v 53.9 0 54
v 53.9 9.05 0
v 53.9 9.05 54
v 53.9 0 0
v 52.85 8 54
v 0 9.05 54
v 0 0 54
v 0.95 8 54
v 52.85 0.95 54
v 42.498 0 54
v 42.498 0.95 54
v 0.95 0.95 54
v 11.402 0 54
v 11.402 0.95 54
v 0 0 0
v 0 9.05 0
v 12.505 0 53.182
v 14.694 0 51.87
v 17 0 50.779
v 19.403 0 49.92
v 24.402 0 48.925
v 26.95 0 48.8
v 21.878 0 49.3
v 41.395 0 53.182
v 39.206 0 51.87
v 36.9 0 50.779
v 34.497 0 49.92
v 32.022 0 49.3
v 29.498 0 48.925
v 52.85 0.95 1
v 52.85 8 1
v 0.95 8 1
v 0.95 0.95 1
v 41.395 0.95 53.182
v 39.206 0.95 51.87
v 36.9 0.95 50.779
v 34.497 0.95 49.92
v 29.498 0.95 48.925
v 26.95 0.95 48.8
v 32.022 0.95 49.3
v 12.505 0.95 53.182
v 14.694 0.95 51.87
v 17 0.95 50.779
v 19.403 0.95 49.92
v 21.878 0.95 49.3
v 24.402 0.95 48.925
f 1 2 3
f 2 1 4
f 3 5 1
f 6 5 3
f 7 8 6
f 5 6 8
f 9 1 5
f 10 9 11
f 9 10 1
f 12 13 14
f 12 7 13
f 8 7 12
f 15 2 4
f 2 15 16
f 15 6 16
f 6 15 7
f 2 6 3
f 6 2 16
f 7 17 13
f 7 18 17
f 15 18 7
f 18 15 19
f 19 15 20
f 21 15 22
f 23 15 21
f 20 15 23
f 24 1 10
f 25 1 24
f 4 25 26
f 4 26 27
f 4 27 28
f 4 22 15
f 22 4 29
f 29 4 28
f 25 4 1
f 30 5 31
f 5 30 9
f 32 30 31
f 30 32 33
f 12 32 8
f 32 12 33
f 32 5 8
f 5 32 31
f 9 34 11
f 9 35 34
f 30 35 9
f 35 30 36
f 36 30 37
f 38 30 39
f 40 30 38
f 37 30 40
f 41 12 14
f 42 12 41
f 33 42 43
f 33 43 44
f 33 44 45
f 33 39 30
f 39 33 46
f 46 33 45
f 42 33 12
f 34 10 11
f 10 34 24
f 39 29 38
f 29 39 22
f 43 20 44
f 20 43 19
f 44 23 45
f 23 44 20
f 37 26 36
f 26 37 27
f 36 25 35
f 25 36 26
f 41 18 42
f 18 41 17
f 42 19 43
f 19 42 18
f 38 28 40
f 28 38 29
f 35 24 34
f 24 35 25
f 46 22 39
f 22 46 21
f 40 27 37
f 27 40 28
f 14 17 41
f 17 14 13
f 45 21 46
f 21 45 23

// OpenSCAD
/* [Filter Settings] */
Filter_Diameter = 52;
Filter_Thickness = 7.15;

/* [Case Settings] */
Case_Thickness = 1;
Width_Offset = -0.1;
Thickness_Offset = -0.1;
Height_Offset = 1;

/* [Hidden] */
Case_X = Filter_Diameter + 2*Case_Thickness + Width_Offset;
Case_Y = Filter_Thickness + 2*Case_Thickness + Thickness_Offset;
Case_Z = Filter_Diameter + Case_Thickness + Height_Offset;

f = 0.01;
df = 2*f;
$fn = 64;

difference() {
    cube([Case_X, Case_Y, Case_Z]);
    translate([(2*Case_Thickness + Width_Offset)/2, (2*Case_Thickness + Thickness_Offset)/2, Case_Thickness])
        cube([Filter_Diameter + Width_Offset, Filter_Thickness + Thickness_Offset, Filter_Diameter + Height_Offset + f]);
    translate([Case_X/2, Case_Thickness + f, Case_Z + Filter_Diameter/2 * 0.8])
        rotate([90, 0, 0])
            cylinder(d = Filter_Diameter, h = Case_Thickness + df);    
}
